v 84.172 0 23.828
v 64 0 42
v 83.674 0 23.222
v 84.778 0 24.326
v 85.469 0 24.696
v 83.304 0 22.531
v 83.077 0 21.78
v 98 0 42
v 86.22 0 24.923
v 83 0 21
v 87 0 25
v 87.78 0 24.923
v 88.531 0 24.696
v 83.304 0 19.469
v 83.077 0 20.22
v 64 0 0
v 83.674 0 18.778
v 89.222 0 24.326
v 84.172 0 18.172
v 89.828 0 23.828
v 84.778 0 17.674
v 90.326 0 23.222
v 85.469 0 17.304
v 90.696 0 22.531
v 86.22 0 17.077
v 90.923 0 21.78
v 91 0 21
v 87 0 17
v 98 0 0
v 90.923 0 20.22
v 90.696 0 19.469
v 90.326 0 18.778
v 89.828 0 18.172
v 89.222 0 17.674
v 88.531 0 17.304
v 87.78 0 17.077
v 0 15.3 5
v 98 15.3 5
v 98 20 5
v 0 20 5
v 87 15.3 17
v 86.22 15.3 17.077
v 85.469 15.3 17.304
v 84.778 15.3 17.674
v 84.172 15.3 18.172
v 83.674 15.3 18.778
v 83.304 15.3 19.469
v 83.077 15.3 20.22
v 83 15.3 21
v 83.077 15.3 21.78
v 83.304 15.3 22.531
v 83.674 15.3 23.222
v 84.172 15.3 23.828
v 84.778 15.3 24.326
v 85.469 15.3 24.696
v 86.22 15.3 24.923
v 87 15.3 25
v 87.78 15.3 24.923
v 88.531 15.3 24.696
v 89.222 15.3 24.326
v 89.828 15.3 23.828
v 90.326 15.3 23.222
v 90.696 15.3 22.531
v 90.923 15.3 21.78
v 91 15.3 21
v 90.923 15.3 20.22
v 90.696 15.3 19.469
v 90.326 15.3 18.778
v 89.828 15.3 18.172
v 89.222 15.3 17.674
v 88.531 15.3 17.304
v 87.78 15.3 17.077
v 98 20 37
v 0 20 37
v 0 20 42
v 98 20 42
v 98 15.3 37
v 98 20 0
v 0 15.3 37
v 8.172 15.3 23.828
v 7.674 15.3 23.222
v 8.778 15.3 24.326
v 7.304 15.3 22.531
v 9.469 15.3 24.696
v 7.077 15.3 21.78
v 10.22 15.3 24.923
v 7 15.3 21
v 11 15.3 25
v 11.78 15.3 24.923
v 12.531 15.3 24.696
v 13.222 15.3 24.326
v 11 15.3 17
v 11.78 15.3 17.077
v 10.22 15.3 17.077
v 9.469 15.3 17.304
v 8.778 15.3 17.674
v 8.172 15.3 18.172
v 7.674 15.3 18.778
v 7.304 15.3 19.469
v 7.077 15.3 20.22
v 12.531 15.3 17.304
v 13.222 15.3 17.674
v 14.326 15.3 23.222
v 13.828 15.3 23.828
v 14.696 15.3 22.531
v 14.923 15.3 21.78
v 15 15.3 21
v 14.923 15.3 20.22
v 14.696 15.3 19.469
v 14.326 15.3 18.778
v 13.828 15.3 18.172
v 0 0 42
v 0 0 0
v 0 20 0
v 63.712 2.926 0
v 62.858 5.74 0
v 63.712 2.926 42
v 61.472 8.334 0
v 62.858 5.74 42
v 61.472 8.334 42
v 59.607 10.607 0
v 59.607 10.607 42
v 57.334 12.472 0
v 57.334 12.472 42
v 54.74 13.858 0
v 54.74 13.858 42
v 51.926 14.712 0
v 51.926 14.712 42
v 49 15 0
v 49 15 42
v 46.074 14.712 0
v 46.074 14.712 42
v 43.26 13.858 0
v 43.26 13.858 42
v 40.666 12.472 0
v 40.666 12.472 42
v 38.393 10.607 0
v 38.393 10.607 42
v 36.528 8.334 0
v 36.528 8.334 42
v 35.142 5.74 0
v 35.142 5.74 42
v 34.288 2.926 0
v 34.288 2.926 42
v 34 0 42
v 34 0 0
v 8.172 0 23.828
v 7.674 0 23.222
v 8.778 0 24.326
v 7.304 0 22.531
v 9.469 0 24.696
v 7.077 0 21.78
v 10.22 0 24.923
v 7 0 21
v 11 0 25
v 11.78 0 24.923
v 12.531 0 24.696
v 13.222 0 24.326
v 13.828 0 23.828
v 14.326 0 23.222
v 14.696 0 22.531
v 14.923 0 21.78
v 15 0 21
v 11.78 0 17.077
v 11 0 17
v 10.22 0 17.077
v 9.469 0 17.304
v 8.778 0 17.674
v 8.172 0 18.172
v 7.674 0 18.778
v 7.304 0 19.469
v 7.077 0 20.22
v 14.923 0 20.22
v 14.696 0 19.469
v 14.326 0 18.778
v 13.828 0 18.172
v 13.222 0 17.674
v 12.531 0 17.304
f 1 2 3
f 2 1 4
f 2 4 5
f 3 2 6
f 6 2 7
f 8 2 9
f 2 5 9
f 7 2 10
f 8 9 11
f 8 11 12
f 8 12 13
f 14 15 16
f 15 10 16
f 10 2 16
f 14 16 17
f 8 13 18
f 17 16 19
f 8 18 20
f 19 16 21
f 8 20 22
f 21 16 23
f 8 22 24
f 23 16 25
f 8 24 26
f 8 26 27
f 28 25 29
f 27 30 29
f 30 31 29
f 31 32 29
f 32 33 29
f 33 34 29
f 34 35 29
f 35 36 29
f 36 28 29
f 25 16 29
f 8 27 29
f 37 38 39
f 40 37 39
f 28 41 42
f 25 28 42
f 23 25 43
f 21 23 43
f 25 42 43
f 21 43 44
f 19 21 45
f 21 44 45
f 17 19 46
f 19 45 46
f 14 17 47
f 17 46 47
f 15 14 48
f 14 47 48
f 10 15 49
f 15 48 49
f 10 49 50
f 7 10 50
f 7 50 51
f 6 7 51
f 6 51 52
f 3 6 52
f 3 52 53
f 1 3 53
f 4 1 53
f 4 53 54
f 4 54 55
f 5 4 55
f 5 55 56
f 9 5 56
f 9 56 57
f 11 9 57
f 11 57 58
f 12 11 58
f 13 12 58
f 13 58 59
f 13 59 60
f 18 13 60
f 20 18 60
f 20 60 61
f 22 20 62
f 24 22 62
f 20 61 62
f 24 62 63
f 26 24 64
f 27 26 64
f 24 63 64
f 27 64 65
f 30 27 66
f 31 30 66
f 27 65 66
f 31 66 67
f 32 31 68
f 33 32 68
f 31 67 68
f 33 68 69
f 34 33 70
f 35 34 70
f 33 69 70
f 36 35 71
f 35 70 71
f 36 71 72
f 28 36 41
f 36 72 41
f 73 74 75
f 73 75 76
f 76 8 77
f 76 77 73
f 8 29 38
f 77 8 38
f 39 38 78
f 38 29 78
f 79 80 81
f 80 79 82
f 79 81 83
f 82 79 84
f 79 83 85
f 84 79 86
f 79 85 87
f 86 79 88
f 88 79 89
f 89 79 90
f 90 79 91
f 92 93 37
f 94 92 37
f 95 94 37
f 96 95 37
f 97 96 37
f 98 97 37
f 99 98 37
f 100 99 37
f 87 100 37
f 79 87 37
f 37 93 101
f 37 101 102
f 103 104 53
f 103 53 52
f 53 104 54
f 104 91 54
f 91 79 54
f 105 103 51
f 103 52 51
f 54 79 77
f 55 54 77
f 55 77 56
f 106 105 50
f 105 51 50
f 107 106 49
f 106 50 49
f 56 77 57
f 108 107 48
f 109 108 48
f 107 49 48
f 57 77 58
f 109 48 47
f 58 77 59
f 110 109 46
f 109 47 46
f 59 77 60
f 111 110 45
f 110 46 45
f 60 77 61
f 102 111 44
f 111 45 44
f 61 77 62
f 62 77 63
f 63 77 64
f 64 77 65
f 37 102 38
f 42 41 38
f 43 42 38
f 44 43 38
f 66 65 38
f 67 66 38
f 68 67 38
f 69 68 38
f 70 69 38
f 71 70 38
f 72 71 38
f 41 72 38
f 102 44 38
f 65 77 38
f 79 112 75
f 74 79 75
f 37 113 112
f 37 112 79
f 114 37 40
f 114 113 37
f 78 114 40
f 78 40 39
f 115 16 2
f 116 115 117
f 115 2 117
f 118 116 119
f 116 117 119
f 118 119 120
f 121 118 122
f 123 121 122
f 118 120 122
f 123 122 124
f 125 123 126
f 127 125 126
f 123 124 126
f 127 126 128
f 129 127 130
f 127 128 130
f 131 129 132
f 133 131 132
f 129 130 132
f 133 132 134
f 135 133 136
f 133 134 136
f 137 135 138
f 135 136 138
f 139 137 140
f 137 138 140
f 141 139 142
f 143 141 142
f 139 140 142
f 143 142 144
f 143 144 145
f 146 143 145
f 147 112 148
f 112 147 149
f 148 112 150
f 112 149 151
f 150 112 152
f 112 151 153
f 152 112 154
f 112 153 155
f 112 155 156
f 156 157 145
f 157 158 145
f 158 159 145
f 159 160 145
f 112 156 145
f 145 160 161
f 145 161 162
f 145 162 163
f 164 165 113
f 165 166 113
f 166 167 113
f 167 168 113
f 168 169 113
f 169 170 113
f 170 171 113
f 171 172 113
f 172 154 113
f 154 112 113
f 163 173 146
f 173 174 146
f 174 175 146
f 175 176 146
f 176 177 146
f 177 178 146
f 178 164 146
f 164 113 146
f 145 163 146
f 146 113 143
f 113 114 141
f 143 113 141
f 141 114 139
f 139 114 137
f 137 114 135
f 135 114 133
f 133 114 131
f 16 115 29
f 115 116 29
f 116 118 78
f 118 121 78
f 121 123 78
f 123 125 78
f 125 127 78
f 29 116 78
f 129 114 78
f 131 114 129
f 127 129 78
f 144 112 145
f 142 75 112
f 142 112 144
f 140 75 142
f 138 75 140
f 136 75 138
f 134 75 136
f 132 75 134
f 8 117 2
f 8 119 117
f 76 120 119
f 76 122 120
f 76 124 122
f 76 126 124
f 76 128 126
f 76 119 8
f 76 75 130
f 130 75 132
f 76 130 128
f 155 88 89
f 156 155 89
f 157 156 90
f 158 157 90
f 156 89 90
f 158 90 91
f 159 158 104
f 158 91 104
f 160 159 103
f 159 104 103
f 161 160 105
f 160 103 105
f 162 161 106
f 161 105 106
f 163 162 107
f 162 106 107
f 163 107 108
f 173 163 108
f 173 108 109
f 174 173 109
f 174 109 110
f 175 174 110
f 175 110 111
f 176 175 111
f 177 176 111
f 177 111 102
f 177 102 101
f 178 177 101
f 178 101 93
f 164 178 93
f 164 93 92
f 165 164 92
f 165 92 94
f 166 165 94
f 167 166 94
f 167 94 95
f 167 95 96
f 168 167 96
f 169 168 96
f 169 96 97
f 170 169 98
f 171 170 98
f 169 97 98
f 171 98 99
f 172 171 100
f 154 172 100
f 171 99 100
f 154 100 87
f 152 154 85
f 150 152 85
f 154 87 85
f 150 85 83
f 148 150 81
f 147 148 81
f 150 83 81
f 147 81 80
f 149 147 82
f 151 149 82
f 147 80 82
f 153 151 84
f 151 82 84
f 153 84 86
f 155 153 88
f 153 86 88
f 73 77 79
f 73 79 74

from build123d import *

# Parameters (mm, degrees)
SKETCH2_W           = 98
SKETCH2_H           = 20
BOSS_EXTRUDE1_DEPTH = 42
SKETCH4_W           = 32
SKETCH4_H           = 4.7
CUT_EXTRUDE1_DEPTH  = 109.480412979
SKETCH6_R           = 4
CUT_EXTRUDE3_DEPTH  = 108.712998287
SKETCH7_R           = 15
CUT_EXTRUDE4_DEPTH  = 109.480412979


with BuildPart() as part:
    # Sketch2 → Boss-Extrude1 (new body)
    with BuildSketch(Plane.XY):
        with Locations((49, 10)):
            Rectangle(SKETCH2_W, SKETCH2_H)
    extrude(amount=BOSS_EXTRUDE1_DEPTH)

    # Sketch4 → Cut-Extrude1 (cut, through all)
    with BuildSketch(Plane(origin=(98, 0, 0), x_dir=(0, 0, -1), z_dir=(1, 0, 0))):
        with Locations((-21, 17.65)):
            Rectangle(SKETCH4_W, SKETCH4_H)
    extrude(amount=-CUT_EXTRUDE1_DEPTH, mode=Mode.SUBTRACT)

    # Sketch6 → Cut-Extrude3 (cut, through all)
    with BuildSketch(Plane(origin=(0, 15.3, 0), x_dir=(1, 0, 0), z_dir=(0, 1, 0))):
        with Locations(Location((11, -21, 0), (0, 0, 270))):
            Circle(SKETCH6_R)
        with Locations(Location((87, -21, 0), (0, 0, 90))):
            Circle(SKETCH6_R)
    extrude(amount=-CUT_EXTRUDE3_DEPTH, mode=Mode.SUBTRACT)

    # Sketch7 → Cut-Extrude4 (cut, through all)
    with BuildSketch(Plane.XY.offset(42)):
        with Locations((49, 0)):
            Circle(SKETCH7_R)
    extrude(amount=-CUT_EXTRUDE4_DEPTH, mode=Mode.SUBTRACT)


solid = part.part
